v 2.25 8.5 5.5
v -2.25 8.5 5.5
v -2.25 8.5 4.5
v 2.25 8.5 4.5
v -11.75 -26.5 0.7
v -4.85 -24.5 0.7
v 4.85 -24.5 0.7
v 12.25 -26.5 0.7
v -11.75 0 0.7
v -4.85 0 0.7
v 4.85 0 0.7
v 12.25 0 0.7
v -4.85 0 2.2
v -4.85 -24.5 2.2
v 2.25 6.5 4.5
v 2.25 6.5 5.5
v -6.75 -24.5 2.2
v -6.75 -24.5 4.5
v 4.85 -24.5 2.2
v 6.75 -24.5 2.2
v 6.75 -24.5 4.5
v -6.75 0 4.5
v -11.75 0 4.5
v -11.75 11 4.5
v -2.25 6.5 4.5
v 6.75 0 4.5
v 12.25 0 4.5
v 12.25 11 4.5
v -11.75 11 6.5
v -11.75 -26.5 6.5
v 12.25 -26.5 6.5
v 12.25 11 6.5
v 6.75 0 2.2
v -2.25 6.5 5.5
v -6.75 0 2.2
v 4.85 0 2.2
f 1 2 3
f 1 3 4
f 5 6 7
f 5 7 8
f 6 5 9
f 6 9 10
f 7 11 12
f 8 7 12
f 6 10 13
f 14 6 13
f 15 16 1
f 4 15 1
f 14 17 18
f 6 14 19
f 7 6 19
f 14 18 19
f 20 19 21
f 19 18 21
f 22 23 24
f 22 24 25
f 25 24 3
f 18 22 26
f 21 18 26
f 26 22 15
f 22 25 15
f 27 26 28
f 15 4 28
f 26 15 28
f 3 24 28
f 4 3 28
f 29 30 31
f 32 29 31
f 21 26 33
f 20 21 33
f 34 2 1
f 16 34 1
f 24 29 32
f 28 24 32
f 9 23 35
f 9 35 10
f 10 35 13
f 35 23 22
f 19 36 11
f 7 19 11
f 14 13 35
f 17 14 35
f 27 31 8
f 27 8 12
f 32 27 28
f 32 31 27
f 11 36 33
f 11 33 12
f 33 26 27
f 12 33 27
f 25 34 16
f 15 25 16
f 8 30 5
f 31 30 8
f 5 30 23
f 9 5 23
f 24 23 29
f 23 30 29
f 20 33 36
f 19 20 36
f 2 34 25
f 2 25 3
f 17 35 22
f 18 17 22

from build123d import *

# Parameters (mm, degrees)
F1_DEPTH = 24.5
F2_W     = 24
F2_H     = 5.8
F3_DEPTH = 2
F4_W     = 24
F4_H     = 11
F4_W_2   = 4.5
F4_H_2   = 2
F5_DEPTH = 2
F6_DEPTH = 1


# Not quite as in the source:
# - a feature of the source that left no trace in its solid (it failed there, or was rolled back) is left out


with BuildPart() as f1:
    # F0 (on Front) → F1 (new body)
    with BuildSketch(Plane.XZ):
        Polygon((-6.75, 2.2), (-6.75, 4.5), (-4.85, 4.5), (-3.2, 4.5), (3.2, 4.5), (4.85, 4.5), (6.75, 4.5), (6.75, 2.2), (4.85, 2.2), (4.85, 0.7), (12.25, 0.7), (12.25, 6.5), (-11.75, 6.5), (-11.75, 0.7), (-4.85, 0.7), (-4.85, 2.2), align=None)
    extrude(amount=F1_DEPTH)

    # F2 (on face) → F3 (join)
    with BuildSketch(Plane.XZ.offset(24.5)):
        with Locations((0.25, 3.6)):
            Rectangle(F2_W, F2_H)
    extrude(amount=F3_DEPTH)

    # F4 (on face) → F5 (join)
    with BuildSketch(Plane.XY.offset(6.5)):
        with Locations((0.25, 5.5)):
            Rectangle(F4_W, F4_H)
        with Locations((0, 7.5)):
            Rectangle(F4_W_2, F4_H_2, mode=Mode.SUBTRACT)
    extrude(amount=-F5_DEPTH)

    # F4 (on face) → F6 (join)
    with BuildSketch(Plane.XY.offset(6.5)):
        with Locations((0, 7.5)):
            Rectangle(F4_W_2, F4_H_2)
    extrude(amount=-F6_DEPTH)


solid = f1.part
